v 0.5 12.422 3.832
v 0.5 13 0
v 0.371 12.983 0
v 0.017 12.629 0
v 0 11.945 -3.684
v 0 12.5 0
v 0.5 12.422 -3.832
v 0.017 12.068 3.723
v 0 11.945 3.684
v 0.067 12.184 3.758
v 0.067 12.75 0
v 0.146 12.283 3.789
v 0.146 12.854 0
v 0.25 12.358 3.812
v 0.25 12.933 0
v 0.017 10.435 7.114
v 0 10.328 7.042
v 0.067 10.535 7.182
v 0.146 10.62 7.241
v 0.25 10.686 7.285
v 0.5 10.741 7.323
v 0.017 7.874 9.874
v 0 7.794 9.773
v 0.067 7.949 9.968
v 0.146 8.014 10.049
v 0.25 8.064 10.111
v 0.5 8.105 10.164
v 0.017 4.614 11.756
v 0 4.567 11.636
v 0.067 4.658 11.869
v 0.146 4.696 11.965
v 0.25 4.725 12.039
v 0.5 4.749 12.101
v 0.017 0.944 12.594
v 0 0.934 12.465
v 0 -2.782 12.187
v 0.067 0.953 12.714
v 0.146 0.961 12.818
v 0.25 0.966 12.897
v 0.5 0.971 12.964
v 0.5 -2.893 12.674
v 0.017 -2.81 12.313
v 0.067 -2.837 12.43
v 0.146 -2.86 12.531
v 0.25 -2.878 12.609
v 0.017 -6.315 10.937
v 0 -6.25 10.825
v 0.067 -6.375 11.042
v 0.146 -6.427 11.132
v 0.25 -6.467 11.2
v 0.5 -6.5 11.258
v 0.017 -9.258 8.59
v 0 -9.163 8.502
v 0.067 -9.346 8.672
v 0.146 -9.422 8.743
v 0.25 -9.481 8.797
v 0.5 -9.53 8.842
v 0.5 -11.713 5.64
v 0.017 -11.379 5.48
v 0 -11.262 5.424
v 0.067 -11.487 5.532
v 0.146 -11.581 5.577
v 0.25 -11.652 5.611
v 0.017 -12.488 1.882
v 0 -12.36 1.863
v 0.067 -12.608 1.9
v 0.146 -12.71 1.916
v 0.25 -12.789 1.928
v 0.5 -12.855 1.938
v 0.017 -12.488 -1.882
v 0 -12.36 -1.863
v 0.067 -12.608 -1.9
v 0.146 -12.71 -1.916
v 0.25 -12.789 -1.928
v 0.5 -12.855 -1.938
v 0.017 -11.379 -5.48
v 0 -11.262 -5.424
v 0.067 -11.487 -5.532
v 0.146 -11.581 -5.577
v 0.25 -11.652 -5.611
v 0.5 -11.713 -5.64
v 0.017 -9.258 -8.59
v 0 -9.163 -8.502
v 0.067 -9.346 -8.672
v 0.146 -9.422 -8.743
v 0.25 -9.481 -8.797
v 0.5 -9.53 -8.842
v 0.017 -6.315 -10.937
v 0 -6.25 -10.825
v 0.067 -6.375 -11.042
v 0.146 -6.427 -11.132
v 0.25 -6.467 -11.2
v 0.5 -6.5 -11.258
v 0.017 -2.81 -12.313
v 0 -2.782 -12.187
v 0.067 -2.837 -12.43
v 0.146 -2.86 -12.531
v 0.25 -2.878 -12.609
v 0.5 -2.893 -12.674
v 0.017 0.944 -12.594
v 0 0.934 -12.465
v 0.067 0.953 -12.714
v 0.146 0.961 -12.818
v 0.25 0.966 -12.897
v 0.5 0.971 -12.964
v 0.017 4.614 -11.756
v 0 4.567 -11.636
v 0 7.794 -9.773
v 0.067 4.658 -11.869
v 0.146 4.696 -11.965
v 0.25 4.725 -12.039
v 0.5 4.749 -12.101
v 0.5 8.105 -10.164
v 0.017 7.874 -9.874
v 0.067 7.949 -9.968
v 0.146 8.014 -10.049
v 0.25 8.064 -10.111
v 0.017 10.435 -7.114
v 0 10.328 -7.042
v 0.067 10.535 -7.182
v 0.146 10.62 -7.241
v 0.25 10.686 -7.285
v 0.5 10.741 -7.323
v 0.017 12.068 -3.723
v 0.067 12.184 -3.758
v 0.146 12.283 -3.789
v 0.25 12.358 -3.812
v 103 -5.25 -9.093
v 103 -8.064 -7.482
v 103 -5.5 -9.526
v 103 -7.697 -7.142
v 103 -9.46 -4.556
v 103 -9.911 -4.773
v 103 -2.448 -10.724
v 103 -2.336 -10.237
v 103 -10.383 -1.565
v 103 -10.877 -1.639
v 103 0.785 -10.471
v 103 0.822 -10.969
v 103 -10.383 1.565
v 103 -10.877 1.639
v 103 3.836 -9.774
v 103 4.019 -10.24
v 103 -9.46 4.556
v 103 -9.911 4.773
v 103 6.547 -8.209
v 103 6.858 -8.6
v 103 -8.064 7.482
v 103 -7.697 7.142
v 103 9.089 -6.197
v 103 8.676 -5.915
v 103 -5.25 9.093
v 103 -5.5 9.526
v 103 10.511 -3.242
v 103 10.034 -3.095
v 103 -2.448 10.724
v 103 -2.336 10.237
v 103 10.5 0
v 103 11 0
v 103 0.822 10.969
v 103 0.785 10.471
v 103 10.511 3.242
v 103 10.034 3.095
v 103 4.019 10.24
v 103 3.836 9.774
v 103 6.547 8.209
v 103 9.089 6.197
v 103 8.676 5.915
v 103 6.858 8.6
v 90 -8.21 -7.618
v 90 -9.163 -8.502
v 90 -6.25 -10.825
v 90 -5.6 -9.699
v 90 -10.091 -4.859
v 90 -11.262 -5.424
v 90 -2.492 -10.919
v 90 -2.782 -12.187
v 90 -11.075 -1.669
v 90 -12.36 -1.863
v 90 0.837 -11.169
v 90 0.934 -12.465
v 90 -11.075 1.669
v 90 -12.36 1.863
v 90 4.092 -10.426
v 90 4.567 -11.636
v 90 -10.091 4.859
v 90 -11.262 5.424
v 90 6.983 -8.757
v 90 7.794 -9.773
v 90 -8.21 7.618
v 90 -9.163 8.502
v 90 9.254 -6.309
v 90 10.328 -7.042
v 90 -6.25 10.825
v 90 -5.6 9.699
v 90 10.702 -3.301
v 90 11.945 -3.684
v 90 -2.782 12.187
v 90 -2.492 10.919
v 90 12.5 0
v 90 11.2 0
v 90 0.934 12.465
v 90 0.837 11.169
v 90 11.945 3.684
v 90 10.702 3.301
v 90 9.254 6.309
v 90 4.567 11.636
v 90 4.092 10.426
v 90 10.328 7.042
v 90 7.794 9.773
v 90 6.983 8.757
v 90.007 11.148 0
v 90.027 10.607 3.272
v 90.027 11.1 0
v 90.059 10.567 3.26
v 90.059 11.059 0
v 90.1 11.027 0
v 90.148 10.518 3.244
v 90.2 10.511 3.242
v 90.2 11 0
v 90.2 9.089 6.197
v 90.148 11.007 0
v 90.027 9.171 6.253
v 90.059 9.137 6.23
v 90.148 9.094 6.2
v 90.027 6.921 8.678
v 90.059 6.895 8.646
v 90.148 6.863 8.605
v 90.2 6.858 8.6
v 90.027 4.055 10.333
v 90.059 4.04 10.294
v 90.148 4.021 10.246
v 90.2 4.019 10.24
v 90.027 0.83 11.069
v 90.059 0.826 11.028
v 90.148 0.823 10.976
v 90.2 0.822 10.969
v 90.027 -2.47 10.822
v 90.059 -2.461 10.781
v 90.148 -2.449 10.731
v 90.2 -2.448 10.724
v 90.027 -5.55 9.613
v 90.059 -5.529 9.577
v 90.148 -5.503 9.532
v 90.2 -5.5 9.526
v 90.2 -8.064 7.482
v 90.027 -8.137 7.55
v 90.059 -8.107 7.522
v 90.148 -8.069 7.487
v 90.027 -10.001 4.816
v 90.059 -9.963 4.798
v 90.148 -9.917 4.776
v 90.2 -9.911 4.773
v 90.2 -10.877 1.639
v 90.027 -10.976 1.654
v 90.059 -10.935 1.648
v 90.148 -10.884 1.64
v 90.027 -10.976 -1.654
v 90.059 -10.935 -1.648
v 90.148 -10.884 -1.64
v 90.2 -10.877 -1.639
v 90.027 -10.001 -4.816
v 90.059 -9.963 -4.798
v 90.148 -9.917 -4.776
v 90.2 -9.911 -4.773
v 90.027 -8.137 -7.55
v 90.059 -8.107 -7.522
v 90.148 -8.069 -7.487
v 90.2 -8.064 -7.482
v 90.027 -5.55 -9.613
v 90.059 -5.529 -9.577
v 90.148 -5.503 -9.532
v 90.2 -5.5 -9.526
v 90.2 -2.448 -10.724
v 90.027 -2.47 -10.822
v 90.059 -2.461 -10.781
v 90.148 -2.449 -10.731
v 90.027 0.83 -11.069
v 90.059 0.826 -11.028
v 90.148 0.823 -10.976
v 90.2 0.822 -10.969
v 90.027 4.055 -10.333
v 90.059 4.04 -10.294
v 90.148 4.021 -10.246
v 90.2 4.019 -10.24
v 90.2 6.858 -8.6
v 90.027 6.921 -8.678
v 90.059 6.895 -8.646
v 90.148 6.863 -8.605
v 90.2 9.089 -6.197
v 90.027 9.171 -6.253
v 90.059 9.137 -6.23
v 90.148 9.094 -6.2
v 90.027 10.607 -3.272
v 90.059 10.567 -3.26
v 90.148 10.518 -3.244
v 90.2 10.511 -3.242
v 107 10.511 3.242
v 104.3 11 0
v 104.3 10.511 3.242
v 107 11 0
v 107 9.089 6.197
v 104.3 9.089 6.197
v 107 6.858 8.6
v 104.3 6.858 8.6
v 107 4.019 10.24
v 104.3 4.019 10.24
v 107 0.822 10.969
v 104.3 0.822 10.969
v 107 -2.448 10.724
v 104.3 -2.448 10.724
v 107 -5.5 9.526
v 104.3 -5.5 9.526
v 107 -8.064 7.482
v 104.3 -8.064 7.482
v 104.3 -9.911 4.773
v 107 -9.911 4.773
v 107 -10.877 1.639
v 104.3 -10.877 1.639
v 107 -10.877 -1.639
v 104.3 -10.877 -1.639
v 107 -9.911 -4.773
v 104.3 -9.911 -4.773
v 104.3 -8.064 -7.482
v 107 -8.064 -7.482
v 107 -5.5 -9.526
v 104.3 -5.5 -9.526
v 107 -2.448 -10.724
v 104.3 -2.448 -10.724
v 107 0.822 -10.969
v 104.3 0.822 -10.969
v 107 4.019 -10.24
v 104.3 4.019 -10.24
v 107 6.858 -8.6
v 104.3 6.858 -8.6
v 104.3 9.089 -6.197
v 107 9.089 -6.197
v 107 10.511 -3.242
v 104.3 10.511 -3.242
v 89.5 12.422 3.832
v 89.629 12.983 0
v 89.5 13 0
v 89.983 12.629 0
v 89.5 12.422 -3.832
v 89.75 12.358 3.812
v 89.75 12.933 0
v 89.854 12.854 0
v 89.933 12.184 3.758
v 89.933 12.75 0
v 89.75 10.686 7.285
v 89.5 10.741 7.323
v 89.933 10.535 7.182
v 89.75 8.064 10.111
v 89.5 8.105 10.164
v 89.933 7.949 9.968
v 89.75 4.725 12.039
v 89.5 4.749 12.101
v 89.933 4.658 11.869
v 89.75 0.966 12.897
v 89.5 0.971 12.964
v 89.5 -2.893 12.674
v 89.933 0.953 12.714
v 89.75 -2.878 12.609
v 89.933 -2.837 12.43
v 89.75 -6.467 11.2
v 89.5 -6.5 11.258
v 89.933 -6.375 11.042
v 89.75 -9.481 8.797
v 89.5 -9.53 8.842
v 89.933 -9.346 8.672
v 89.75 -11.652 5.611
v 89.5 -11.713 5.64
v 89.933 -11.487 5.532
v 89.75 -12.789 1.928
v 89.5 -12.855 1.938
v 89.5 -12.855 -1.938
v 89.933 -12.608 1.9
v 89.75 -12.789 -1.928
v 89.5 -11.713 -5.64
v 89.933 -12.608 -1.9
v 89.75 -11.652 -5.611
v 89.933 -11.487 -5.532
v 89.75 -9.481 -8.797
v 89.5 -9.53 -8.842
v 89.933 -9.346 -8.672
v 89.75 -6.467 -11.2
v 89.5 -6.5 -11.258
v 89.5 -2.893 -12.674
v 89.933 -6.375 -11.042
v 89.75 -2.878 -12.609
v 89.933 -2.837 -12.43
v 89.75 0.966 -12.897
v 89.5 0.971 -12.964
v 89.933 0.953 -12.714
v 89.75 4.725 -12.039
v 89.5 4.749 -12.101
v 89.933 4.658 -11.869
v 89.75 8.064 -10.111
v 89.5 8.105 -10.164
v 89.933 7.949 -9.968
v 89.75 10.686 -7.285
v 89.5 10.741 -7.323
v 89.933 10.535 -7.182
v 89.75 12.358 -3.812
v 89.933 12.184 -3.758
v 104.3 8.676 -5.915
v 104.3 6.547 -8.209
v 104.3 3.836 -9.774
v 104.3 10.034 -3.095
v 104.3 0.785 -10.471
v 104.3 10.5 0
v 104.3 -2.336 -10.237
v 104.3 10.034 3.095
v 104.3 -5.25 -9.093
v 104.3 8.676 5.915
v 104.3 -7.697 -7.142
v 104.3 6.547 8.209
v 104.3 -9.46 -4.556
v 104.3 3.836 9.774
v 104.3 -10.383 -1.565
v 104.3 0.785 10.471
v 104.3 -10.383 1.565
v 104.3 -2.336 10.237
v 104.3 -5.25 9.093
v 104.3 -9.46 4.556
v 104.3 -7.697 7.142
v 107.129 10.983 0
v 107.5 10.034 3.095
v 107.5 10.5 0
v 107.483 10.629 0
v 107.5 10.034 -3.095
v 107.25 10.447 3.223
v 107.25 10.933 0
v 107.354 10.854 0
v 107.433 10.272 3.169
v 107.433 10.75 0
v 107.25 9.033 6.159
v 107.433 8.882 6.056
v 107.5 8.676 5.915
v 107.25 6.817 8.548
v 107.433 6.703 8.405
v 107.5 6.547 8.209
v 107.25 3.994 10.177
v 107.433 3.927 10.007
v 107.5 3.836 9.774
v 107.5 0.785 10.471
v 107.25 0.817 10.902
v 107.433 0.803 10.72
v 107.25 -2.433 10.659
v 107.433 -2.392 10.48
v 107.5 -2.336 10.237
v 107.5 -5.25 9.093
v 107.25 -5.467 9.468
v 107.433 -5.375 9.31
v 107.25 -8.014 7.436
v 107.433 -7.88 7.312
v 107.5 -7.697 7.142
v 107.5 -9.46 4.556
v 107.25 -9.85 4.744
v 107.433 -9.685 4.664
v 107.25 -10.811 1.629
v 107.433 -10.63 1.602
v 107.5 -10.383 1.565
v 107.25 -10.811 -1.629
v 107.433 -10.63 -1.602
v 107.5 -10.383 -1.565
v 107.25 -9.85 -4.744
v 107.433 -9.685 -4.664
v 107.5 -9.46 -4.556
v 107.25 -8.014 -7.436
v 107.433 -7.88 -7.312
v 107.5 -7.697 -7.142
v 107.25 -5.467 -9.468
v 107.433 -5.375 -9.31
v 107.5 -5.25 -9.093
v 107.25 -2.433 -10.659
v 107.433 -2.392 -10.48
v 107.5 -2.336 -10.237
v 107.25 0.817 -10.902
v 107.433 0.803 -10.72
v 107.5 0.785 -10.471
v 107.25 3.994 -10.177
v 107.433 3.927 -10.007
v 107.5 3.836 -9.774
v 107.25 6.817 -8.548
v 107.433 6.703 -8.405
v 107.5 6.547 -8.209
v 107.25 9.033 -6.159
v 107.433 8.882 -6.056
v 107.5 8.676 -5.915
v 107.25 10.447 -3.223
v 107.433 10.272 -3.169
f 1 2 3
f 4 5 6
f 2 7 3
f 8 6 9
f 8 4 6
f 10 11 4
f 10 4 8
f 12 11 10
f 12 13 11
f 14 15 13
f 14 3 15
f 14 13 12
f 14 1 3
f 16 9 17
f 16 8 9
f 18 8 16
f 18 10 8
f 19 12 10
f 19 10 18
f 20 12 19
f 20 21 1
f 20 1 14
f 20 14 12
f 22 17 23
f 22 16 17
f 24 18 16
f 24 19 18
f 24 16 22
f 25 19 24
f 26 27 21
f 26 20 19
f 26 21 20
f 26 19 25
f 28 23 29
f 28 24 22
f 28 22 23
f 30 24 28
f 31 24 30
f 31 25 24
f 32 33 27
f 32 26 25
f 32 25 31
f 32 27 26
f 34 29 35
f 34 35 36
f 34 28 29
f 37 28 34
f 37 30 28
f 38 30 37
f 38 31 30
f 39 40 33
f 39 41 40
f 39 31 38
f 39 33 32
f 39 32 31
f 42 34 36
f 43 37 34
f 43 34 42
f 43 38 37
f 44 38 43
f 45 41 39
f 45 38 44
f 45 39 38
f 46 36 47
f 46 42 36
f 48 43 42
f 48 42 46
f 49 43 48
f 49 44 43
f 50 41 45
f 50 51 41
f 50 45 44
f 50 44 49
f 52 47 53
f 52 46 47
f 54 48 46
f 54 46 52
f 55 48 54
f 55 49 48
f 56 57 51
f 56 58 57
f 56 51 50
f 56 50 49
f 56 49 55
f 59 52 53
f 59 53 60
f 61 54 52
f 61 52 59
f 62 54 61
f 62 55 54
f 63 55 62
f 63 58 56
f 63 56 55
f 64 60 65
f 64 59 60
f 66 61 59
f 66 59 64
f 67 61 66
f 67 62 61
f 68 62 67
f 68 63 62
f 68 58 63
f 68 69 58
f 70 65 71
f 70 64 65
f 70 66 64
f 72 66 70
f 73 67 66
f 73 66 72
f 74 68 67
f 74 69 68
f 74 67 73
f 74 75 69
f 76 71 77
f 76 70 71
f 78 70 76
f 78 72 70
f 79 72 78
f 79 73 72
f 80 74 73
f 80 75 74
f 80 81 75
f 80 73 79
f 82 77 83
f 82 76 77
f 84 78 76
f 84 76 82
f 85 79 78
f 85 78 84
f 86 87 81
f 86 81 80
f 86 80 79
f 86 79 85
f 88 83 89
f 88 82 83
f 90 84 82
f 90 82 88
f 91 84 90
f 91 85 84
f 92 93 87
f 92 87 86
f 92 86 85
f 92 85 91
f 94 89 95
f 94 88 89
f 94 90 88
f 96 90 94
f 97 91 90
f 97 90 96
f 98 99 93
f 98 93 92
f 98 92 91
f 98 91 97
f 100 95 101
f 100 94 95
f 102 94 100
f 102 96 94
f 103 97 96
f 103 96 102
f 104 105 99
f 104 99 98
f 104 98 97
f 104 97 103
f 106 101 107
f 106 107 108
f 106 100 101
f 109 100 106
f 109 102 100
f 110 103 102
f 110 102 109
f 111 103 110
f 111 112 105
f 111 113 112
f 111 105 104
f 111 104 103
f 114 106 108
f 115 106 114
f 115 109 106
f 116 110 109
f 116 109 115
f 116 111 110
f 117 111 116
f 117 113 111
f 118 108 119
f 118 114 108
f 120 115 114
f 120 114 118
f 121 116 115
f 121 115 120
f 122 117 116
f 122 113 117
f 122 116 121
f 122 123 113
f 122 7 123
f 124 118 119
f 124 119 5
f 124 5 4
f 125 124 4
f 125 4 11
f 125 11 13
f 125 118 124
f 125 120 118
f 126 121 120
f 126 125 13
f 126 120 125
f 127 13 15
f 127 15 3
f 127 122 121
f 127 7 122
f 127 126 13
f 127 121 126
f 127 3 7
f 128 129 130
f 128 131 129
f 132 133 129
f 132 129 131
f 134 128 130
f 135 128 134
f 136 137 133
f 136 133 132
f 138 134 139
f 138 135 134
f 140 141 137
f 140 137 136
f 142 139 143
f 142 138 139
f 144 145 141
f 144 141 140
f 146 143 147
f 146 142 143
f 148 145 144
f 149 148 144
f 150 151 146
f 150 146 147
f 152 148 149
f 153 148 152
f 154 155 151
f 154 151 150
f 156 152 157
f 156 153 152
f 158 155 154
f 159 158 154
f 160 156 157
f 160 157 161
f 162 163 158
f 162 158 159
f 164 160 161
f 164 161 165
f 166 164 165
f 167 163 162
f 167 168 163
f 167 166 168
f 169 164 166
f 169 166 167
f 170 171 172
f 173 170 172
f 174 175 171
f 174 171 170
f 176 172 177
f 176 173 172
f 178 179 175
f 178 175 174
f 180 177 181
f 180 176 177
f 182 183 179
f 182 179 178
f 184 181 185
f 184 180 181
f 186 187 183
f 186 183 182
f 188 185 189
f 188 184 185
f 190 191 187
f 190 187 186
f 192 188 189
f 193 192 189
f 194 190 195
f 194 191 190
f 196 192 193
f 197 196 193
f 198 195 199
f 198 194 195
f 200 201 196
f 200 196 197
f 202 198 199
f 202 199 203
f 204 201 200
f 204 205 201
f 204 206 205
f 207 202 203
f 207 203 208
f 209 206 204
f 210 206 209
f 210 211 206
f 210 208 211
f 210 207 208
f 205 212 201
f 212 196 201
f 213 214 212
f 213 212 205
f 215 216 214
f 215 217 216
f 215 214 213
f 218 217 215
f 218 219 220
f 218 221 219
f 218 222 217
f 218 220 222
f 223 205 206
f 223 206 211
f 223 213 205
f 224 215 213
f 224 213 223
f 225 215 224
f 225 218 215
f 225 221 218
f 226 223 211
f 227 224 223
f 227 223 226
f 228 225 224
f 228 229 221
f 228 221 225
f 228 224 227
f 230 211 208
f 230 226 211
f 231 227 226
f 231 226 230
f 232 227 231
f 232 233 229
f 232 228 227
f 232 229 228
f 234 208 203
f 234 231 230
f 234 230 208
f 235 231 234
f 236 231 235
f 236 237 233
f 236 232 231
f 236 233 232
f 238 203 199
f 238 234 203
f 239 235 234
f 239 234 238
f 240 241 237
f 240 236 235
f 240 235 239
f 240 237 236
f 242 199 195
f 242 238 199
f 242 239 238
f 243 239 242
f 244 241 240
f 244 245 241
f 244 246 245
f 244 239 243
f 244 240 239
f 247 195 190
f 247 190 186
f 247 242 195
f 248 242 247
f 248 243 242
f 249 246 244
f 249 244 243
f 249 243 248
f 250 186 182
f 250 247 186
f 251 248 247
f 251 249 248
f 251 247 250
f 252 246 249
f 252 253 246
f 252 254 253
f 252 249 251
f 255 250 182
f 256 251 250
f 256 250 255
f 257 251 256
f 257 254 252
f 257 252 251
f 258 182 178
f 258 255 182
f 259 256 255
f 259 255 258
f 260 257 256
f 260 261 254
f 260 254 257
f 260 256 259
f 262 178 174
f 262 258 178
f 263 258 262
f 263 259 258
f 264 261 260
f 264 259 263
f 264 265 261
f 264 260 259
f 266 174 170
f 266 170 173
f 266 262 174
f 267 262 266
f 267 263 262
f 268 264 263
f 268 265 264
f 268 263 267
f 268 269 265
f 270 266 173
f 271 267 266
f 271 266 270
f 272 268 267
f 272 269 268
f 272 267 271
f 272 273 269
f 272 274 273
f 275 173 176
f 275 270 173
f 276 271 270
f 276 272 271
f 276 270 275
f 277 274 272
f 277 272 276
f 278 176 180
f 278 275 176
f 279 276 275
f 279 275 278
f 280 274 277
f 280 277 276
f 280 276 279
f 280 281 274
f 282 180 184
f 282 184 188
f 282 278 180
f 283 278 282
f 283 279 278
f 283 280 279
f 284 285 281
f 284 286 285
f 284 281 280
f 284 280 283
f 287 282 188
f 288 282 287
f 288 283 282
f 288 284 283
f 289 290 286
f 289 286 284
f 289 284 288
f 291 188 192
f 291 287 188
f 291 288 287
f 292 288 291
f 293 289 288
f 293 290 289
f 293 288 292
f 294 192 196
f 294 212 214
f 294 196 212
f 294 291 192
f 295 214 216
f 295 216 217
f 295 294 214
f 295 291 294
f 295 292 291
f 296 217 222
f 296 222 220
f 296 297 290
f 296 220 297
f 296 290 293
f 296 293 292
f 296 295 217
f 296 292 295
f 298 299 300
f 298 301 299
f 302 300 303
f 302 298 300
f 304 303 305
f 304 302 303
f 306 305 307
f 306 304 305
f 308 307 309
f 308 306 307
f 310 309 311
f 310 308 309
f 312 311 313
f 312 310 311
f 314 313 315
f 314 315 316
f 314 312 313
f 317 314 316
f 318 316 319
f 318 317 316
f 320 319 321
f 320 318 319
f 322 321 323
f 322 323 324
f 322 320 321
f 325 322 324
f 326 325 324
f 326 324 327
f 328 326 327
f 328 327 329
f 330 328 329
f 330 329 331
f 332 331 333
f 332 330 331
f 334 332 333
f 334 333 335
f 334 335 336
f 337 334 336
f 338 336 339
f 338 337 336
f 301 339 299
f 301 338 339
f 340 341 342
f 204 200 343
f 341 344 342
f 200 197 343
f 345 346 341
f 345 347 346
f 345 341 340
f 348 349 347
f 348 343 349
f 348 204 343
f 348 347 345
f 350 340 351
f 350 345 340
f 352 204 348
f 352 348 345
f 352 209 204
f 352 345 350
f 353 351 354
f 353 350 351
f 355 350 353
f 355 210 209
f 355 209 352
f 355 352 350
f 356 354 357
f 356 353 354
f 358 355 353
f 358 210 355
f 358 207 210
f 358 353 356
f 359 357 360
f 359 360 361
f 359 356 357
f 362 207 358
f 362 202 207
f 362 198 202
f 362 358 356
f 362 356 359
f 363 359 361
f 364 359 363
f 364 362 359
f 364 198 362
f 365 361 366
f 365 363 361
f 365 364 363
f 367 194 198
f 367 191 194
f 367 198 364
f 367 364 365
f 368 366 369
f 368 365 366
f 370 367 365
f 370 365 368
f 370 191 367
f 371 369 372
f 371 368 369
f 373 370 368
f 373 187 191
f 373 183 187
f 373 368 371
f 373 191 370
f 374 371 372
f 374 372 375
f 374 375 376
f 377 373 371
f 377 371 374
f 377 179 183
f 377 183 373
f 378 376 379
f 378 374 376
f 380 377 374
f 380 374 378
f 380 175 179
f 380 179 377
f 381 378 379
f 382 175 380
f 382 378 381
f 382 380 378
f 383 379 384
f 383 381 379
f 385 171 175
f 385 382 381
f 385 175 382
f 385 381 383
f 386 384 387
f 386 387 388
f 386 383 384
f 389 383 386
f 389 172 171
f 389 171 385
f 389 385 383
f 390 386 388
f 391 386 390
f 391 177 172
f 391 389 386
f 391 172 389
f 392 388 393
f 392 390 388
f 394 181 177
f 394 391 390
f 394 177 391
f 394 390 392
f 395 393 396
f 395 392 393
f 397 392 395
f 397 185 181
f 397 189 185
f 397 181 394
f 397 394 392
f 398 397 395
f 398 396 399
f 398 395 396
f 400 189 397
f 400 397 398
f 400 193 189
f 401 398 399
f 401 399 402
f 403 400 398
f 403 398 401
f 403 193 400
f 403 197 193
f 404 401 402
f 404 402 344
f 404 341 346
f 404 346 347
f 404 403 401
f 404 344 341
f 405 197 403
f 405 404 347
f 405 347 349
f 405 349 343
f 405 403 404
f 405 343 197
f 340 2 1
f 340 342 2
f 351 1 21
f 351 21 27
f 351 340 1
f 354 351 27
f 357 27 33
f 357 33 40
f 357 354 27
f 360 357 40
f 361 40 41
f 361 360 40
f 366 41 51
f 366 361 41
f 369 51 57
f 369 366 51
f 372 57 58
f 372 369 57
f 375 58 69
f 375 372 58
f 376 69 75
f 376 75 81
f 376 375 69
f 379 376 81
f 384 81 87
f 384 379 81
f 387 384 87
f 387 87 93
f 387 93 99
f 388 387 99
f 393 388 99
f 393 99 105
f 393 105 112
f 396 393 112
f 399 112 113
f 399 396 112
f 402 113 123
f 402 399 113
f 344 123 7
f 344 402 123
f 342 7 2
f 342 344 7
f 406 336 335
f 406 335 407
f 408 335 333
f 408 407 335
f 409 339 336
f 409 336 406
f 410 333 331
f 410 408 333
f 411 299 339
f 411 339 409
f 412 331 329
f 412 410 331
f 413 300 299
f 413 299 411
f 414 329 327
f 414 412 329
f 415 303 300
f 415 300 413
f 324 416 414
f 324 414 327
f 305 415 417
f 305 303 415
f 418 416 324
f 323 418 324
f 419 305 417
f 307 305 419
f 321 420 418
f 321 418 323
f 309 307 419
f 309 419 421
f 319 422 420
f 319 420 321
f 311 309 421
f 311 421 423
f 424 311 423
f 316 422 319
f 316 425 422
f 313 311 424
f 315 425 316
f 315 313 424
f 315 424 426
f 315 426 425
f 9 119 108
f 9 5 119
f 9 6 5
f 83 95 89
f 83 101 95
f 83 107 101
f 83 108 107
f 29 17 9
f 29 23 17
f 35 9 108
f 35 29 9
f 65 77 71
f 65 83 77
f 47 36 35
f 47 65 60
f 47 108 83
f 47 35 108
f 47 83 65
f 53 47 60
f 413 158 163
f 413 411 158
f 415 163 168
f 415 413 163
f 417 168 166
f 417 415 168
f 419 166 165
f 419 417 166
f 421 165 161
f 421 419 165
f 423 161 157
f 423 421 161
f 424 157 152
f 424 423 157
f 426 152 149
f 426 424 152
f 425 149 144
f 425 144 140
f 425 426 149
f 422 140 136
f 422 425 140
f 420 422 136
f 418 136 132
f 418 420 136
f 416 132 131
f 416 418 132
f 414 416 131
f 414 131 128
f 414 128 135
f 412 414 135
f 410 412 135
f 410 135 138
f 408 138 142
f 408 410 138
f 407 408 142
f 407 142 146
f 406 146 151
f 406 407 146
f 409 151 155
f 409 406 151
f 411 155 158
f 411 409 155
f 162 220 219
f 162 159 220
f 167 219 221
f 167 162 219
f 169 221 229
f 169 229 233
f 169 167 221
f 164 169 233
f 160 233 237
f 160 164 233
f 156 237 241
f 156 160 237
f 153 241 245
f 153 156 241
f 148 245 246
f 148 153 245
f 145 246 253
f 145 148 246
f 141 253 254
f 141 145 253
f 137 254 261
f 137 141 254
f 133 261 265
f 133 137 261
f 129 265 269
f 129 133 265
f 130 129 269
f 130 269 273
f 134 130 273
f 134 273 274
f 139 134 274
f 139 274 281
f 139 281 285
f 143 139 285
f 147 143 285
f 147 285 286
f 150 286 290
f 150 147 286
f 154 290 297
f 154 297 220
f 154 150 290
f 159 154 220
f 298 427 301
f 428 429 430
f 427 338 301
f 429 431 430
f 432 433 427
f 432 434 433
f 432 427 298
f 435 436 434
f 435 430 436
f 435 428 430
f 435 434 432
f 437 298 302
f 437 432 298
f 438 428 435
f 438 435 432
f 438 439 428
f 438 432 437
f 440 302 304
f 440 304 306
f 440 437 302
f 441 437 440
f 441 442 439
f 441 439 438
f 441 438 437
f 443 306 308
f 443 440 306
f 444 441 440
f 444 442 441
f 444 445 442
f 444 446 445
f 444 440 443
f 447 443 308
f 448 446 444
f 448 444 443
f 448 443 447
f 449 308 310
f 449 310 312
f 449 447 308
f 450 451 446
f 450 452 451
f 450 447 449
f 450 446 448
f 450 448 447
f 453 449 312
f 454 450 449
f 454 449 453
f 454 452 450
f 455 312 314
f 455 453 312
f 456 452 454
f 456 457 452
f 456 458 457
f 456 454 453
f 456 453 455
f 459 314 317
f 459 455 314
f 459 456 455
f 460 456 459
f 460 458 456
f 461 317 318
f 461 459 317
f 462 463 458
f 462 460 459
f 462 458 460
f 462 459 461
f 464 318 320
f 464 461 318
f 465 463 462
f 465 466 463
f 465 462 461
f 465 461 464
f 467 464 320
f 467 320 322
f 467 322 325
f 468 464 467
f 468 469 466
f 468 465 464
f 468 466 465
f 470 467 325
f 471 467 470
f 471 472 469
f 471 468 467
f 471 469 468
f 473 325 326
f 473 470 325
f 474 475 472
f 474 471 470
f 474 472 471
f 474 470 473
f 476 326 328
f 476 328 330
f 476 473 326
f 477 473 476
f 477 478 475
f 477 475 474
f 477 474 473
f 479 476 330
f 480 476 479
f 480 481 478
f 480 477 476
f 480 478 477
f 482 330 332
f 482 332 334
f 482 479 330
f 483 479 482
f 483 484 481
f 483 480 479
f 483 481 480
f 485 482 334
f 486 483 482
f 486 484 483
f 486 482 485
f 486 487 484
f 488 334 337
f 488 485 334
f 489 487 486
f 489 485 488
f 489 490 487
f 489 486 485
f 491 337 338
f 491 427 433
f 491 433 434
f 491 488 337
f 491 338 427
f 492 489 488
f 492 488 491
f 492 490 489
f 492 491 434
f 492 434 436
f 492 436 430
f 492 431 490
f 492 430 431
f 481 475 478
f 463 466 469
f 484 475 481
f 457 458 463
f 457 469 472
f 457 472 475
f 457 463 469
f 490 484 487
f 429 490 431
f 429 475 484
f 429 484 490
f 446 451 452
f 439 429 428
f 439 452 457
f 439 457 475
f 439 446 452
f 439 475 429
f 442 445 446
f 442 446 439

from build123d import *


with BuildPart() as part:
    # Sketch1 → Revolve1 (revolve)
    with BuildSketch(Plane.XY):
        with BuildLine():
            Line((0, 0), (0, 12.5))
            ThreePointArc((0, 12.5), (0.146446609, 12.853553391), (0.5, 13))
            Line((0.5, 13), (89.5, 13))
            ThreePointArc((89.5, 13), (89.853553391, 12.853553391), (90, 12.5))
            Line((90, 12.5), (90, 11.2))
            ThreePointArc((90, 11.2), (90.058578644, 11.058578644), (90.2, 11))
            Line((90.2, 11), (103, 11))
            Line((103, 11), (103, 10.5))
            Line((103, 10.5), (104.3, 10.5))
            Line((104.3, 10.5), (104.3, 11))
            Line((104.3, 11), (107, 11))
            ThreePointArc((107, 11), (107.353553391, 10.853553391), (107.5, 10.5))
            Line((107.5, 10.5), (107.5, 0))
            Line((107.5, 0), (0, 0))
        make_face()
    revolve(axis=Axis((0, 0, 0), (1, 0, 0)))


solid = part.part
